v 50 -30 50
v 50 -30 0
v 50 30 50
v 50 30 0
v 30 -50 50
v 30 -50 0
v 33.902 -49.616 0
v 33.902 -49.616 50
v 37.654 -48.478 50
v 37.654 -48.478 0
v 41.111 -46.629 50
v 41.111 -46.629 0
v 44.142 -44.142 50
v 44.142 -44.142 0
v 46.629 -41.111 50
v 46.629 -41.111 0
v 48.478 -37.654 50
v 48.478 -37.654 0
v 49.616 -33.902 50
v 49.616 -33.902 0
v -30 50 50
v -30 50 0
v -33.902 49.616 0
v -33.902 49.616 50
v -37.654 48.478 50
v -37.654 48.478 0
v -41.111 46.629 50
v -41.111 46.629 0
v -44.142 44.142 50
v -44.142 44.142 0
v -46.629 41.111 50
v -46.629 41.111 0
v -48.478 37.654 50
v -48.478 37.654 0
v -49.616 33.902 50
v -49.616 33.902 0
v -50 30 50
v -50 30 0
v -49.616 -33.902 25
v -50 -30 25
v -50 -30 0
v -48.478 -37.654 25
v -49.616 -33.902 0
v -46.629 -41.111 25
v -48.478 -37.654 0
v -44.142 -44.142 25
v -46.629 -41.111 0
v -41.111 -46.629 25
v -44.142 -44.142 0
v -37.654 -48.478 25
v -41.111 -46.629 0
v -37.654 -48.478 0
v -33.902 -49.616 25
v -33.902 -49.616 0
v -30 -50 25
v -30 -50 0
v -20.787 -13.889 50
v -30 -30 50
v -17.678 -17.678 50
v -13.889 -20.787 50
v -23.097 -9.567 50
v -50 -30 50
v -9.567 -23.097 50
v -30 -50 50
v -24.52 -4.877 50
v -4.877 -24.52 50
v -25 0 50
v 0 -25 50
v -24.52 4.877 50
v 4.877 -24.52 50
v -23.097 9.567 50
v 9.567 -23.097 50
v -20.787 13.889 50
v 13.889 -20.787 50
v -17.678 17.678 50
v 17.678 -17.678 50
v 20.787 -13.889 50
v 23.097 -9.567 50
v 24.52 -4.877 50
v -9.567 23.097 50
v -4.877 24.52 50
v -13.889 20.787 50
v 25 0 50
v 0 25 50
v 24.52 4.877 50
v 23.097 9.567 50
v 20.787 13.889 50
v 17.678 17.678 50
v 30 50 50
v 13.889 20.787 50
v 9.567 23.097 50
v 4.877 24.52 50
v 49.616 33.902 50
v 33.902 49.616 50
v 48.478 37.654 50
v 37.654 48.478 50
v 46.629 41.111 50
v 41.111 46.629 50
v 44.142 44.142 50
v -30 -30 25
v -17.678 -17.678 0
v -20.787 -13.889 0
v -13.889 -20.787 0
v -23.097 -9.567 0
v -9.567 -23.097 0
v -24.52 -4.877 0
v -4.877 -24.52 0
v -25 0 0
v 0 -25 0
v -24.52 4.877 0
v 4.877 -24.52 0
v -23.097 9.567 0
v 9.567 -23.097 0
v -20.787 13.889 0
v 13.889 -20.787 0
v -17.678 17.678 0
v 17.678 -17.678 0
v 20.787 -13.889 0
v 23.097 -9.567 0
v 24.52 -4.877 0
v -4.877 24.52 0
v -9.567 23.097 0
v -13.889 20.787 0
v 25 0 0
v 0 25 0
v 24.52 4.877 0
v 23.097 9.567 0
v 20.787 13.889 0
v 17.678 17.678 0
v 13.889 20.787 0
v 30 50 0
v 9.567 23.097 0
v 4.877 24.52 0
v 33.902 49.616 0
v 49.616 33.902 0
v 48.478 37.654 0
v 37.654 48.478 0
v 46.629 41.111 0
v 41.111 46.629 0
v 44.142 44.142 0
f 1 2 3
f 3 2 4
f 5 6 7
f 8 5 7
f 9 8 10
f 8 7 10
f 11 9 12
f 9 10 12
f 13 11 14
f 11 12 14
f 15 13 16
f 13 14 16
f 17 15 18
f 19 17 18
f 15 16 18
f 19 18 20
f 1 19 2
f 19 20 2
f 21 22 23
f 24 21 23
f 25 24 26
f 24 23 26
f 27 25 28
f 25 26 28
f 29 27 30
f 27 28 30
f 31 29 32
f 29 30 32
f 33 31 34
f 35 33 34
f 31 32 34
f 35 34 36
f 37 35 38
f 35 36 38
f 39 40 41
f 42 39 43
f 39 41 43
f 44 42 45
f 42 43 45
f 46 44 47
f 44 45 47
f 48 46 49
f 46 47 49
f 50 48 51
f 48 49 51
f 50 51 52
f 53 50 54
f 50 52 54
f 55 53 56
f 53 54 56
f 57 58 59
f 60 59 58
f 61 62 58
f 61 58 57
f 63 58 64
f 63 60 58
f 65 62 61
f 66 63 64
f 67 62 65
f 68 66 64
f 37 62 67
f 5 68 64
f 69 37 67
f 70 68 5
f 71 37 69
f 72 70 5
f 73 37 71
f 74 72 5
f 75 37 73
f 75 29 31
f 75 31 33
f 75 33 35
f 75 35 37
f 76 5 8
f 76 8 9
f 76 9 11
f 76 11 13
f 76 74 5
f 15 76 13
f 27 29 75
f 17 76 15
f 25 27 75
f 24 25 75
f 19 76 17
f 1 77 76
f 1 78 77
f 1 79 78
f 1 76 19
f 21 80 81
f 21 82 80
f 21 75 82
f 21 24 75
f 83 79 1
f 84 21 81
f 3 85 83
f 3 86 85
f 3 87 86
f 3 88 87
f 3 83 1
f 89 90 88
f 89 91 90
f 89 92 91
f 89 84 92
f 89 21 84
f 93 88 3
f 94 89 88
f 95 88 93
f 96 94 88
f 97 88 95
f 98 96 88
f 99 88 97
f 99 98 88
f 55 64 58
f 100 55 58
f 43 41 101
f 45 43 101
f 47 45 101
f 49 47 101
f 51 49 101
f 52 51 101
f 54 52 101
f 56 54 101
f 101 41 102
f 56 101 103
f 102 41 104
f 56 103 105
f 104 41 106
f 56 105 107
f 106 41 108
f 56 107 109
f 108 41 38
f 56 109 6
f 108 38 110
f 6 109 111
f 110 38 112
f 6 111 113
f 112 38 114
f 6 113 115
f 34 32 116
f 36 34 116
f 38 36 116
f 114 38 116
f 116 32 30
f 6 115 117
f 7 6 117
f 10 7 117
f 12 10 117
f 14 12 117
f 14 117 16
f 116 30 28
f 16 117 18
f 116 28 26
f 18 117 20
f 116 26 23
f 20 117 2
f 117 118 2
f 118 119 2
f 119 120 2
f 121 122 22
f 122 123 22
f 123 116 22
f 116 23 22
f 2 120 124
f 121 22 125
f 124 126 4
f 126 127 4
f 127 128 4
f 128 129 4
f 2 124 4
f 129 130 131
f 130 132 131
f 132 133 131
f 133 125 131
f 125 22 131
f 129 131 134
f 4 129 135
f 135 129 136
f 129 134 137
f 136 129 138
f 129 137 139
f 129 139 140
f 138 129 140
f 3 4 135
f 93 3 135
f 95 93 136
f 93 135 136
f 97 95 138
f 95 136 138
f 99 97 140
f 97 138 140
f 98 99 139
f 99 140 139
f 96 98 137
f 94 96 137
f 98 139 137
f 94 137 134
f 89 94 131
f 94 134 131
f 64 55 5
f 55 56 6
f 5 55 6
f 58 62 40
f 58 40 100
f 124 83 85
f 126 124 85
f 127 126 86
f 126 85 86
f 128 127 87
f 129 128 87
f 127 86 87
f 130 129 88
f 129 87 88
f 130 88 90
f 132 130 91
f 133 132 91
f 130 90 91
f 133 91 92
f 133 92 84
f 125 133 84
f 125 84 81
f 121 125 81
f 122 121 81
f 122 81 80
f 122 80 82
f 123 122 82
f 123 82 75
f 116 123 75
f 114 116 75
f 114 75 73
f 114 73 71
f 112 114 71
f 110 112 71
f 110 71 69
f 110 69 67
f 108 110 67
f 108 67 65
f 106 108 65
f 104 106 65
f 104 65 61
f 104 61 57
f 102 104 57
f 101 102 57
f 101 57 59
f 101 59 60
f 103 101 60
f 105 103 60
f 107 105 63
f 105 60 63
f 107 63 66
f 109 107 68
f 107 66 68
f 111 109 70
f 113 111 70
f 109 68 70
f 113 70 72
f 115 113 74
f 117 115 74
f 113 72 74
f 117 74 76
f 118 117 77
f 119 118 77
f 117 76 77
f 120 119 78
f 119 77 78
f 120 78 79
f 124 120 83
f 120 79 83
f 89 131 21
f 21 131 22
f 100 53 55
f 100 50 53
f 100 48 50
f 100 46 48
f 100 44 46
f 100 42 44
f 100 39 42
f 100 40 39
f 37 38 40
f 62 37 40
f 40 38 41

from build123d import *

# Parameters (mm, degrees)
F1_DEPTH = 50
F2_R     = 25
F3_DEPTH = 50.001
F4_W     = 20
F4_H     = 20
F5_DEPTH = 25


with BuildPart() as f1:
    # F0 (on Top) → F1 (new body)
    with BuildSketch(Plane.XY):
        with BuildLine():
            ThreePointArc((50, 30), (44.142136, 44.142136), (30, 50))
            Line((30, 50), (-30, 50))
            ThreePointArc((-30, 50), (-44.142136, 44.142136), (-50, 30))
            Line((-50, 30), (-50, -30))
            ThreePointArc((-50, -30), (-44.142136, -44.142136), (-30, -50))
            Line((-30, -50), (30, -50))
            ThreePointArc((30, -50), (44.142136, -44.142136), (50, -30))
            Line((50, -30), (50, 30))
        make_face()
    extrude(amount=F1_DEPTH)

    # F2 (on face) → F3 (cut, through all)
    with BuildSketch(Plane.XY.offset(50)):
        Circle(F2_R)
    extrude(amount=-F3_DEPTH, mode=Mode.SUBTRACT)

    # F4 (on face) → F5 (cut)
    with BuildSketch(Plane.XY.offset(50)):
        with Locations((-40, -40)):
            Rectangle(F4_W, F4_H)
    extrude(amount=-F5_DEPTH, mode=Mode.SUBTRACT)


solid = f1.part
